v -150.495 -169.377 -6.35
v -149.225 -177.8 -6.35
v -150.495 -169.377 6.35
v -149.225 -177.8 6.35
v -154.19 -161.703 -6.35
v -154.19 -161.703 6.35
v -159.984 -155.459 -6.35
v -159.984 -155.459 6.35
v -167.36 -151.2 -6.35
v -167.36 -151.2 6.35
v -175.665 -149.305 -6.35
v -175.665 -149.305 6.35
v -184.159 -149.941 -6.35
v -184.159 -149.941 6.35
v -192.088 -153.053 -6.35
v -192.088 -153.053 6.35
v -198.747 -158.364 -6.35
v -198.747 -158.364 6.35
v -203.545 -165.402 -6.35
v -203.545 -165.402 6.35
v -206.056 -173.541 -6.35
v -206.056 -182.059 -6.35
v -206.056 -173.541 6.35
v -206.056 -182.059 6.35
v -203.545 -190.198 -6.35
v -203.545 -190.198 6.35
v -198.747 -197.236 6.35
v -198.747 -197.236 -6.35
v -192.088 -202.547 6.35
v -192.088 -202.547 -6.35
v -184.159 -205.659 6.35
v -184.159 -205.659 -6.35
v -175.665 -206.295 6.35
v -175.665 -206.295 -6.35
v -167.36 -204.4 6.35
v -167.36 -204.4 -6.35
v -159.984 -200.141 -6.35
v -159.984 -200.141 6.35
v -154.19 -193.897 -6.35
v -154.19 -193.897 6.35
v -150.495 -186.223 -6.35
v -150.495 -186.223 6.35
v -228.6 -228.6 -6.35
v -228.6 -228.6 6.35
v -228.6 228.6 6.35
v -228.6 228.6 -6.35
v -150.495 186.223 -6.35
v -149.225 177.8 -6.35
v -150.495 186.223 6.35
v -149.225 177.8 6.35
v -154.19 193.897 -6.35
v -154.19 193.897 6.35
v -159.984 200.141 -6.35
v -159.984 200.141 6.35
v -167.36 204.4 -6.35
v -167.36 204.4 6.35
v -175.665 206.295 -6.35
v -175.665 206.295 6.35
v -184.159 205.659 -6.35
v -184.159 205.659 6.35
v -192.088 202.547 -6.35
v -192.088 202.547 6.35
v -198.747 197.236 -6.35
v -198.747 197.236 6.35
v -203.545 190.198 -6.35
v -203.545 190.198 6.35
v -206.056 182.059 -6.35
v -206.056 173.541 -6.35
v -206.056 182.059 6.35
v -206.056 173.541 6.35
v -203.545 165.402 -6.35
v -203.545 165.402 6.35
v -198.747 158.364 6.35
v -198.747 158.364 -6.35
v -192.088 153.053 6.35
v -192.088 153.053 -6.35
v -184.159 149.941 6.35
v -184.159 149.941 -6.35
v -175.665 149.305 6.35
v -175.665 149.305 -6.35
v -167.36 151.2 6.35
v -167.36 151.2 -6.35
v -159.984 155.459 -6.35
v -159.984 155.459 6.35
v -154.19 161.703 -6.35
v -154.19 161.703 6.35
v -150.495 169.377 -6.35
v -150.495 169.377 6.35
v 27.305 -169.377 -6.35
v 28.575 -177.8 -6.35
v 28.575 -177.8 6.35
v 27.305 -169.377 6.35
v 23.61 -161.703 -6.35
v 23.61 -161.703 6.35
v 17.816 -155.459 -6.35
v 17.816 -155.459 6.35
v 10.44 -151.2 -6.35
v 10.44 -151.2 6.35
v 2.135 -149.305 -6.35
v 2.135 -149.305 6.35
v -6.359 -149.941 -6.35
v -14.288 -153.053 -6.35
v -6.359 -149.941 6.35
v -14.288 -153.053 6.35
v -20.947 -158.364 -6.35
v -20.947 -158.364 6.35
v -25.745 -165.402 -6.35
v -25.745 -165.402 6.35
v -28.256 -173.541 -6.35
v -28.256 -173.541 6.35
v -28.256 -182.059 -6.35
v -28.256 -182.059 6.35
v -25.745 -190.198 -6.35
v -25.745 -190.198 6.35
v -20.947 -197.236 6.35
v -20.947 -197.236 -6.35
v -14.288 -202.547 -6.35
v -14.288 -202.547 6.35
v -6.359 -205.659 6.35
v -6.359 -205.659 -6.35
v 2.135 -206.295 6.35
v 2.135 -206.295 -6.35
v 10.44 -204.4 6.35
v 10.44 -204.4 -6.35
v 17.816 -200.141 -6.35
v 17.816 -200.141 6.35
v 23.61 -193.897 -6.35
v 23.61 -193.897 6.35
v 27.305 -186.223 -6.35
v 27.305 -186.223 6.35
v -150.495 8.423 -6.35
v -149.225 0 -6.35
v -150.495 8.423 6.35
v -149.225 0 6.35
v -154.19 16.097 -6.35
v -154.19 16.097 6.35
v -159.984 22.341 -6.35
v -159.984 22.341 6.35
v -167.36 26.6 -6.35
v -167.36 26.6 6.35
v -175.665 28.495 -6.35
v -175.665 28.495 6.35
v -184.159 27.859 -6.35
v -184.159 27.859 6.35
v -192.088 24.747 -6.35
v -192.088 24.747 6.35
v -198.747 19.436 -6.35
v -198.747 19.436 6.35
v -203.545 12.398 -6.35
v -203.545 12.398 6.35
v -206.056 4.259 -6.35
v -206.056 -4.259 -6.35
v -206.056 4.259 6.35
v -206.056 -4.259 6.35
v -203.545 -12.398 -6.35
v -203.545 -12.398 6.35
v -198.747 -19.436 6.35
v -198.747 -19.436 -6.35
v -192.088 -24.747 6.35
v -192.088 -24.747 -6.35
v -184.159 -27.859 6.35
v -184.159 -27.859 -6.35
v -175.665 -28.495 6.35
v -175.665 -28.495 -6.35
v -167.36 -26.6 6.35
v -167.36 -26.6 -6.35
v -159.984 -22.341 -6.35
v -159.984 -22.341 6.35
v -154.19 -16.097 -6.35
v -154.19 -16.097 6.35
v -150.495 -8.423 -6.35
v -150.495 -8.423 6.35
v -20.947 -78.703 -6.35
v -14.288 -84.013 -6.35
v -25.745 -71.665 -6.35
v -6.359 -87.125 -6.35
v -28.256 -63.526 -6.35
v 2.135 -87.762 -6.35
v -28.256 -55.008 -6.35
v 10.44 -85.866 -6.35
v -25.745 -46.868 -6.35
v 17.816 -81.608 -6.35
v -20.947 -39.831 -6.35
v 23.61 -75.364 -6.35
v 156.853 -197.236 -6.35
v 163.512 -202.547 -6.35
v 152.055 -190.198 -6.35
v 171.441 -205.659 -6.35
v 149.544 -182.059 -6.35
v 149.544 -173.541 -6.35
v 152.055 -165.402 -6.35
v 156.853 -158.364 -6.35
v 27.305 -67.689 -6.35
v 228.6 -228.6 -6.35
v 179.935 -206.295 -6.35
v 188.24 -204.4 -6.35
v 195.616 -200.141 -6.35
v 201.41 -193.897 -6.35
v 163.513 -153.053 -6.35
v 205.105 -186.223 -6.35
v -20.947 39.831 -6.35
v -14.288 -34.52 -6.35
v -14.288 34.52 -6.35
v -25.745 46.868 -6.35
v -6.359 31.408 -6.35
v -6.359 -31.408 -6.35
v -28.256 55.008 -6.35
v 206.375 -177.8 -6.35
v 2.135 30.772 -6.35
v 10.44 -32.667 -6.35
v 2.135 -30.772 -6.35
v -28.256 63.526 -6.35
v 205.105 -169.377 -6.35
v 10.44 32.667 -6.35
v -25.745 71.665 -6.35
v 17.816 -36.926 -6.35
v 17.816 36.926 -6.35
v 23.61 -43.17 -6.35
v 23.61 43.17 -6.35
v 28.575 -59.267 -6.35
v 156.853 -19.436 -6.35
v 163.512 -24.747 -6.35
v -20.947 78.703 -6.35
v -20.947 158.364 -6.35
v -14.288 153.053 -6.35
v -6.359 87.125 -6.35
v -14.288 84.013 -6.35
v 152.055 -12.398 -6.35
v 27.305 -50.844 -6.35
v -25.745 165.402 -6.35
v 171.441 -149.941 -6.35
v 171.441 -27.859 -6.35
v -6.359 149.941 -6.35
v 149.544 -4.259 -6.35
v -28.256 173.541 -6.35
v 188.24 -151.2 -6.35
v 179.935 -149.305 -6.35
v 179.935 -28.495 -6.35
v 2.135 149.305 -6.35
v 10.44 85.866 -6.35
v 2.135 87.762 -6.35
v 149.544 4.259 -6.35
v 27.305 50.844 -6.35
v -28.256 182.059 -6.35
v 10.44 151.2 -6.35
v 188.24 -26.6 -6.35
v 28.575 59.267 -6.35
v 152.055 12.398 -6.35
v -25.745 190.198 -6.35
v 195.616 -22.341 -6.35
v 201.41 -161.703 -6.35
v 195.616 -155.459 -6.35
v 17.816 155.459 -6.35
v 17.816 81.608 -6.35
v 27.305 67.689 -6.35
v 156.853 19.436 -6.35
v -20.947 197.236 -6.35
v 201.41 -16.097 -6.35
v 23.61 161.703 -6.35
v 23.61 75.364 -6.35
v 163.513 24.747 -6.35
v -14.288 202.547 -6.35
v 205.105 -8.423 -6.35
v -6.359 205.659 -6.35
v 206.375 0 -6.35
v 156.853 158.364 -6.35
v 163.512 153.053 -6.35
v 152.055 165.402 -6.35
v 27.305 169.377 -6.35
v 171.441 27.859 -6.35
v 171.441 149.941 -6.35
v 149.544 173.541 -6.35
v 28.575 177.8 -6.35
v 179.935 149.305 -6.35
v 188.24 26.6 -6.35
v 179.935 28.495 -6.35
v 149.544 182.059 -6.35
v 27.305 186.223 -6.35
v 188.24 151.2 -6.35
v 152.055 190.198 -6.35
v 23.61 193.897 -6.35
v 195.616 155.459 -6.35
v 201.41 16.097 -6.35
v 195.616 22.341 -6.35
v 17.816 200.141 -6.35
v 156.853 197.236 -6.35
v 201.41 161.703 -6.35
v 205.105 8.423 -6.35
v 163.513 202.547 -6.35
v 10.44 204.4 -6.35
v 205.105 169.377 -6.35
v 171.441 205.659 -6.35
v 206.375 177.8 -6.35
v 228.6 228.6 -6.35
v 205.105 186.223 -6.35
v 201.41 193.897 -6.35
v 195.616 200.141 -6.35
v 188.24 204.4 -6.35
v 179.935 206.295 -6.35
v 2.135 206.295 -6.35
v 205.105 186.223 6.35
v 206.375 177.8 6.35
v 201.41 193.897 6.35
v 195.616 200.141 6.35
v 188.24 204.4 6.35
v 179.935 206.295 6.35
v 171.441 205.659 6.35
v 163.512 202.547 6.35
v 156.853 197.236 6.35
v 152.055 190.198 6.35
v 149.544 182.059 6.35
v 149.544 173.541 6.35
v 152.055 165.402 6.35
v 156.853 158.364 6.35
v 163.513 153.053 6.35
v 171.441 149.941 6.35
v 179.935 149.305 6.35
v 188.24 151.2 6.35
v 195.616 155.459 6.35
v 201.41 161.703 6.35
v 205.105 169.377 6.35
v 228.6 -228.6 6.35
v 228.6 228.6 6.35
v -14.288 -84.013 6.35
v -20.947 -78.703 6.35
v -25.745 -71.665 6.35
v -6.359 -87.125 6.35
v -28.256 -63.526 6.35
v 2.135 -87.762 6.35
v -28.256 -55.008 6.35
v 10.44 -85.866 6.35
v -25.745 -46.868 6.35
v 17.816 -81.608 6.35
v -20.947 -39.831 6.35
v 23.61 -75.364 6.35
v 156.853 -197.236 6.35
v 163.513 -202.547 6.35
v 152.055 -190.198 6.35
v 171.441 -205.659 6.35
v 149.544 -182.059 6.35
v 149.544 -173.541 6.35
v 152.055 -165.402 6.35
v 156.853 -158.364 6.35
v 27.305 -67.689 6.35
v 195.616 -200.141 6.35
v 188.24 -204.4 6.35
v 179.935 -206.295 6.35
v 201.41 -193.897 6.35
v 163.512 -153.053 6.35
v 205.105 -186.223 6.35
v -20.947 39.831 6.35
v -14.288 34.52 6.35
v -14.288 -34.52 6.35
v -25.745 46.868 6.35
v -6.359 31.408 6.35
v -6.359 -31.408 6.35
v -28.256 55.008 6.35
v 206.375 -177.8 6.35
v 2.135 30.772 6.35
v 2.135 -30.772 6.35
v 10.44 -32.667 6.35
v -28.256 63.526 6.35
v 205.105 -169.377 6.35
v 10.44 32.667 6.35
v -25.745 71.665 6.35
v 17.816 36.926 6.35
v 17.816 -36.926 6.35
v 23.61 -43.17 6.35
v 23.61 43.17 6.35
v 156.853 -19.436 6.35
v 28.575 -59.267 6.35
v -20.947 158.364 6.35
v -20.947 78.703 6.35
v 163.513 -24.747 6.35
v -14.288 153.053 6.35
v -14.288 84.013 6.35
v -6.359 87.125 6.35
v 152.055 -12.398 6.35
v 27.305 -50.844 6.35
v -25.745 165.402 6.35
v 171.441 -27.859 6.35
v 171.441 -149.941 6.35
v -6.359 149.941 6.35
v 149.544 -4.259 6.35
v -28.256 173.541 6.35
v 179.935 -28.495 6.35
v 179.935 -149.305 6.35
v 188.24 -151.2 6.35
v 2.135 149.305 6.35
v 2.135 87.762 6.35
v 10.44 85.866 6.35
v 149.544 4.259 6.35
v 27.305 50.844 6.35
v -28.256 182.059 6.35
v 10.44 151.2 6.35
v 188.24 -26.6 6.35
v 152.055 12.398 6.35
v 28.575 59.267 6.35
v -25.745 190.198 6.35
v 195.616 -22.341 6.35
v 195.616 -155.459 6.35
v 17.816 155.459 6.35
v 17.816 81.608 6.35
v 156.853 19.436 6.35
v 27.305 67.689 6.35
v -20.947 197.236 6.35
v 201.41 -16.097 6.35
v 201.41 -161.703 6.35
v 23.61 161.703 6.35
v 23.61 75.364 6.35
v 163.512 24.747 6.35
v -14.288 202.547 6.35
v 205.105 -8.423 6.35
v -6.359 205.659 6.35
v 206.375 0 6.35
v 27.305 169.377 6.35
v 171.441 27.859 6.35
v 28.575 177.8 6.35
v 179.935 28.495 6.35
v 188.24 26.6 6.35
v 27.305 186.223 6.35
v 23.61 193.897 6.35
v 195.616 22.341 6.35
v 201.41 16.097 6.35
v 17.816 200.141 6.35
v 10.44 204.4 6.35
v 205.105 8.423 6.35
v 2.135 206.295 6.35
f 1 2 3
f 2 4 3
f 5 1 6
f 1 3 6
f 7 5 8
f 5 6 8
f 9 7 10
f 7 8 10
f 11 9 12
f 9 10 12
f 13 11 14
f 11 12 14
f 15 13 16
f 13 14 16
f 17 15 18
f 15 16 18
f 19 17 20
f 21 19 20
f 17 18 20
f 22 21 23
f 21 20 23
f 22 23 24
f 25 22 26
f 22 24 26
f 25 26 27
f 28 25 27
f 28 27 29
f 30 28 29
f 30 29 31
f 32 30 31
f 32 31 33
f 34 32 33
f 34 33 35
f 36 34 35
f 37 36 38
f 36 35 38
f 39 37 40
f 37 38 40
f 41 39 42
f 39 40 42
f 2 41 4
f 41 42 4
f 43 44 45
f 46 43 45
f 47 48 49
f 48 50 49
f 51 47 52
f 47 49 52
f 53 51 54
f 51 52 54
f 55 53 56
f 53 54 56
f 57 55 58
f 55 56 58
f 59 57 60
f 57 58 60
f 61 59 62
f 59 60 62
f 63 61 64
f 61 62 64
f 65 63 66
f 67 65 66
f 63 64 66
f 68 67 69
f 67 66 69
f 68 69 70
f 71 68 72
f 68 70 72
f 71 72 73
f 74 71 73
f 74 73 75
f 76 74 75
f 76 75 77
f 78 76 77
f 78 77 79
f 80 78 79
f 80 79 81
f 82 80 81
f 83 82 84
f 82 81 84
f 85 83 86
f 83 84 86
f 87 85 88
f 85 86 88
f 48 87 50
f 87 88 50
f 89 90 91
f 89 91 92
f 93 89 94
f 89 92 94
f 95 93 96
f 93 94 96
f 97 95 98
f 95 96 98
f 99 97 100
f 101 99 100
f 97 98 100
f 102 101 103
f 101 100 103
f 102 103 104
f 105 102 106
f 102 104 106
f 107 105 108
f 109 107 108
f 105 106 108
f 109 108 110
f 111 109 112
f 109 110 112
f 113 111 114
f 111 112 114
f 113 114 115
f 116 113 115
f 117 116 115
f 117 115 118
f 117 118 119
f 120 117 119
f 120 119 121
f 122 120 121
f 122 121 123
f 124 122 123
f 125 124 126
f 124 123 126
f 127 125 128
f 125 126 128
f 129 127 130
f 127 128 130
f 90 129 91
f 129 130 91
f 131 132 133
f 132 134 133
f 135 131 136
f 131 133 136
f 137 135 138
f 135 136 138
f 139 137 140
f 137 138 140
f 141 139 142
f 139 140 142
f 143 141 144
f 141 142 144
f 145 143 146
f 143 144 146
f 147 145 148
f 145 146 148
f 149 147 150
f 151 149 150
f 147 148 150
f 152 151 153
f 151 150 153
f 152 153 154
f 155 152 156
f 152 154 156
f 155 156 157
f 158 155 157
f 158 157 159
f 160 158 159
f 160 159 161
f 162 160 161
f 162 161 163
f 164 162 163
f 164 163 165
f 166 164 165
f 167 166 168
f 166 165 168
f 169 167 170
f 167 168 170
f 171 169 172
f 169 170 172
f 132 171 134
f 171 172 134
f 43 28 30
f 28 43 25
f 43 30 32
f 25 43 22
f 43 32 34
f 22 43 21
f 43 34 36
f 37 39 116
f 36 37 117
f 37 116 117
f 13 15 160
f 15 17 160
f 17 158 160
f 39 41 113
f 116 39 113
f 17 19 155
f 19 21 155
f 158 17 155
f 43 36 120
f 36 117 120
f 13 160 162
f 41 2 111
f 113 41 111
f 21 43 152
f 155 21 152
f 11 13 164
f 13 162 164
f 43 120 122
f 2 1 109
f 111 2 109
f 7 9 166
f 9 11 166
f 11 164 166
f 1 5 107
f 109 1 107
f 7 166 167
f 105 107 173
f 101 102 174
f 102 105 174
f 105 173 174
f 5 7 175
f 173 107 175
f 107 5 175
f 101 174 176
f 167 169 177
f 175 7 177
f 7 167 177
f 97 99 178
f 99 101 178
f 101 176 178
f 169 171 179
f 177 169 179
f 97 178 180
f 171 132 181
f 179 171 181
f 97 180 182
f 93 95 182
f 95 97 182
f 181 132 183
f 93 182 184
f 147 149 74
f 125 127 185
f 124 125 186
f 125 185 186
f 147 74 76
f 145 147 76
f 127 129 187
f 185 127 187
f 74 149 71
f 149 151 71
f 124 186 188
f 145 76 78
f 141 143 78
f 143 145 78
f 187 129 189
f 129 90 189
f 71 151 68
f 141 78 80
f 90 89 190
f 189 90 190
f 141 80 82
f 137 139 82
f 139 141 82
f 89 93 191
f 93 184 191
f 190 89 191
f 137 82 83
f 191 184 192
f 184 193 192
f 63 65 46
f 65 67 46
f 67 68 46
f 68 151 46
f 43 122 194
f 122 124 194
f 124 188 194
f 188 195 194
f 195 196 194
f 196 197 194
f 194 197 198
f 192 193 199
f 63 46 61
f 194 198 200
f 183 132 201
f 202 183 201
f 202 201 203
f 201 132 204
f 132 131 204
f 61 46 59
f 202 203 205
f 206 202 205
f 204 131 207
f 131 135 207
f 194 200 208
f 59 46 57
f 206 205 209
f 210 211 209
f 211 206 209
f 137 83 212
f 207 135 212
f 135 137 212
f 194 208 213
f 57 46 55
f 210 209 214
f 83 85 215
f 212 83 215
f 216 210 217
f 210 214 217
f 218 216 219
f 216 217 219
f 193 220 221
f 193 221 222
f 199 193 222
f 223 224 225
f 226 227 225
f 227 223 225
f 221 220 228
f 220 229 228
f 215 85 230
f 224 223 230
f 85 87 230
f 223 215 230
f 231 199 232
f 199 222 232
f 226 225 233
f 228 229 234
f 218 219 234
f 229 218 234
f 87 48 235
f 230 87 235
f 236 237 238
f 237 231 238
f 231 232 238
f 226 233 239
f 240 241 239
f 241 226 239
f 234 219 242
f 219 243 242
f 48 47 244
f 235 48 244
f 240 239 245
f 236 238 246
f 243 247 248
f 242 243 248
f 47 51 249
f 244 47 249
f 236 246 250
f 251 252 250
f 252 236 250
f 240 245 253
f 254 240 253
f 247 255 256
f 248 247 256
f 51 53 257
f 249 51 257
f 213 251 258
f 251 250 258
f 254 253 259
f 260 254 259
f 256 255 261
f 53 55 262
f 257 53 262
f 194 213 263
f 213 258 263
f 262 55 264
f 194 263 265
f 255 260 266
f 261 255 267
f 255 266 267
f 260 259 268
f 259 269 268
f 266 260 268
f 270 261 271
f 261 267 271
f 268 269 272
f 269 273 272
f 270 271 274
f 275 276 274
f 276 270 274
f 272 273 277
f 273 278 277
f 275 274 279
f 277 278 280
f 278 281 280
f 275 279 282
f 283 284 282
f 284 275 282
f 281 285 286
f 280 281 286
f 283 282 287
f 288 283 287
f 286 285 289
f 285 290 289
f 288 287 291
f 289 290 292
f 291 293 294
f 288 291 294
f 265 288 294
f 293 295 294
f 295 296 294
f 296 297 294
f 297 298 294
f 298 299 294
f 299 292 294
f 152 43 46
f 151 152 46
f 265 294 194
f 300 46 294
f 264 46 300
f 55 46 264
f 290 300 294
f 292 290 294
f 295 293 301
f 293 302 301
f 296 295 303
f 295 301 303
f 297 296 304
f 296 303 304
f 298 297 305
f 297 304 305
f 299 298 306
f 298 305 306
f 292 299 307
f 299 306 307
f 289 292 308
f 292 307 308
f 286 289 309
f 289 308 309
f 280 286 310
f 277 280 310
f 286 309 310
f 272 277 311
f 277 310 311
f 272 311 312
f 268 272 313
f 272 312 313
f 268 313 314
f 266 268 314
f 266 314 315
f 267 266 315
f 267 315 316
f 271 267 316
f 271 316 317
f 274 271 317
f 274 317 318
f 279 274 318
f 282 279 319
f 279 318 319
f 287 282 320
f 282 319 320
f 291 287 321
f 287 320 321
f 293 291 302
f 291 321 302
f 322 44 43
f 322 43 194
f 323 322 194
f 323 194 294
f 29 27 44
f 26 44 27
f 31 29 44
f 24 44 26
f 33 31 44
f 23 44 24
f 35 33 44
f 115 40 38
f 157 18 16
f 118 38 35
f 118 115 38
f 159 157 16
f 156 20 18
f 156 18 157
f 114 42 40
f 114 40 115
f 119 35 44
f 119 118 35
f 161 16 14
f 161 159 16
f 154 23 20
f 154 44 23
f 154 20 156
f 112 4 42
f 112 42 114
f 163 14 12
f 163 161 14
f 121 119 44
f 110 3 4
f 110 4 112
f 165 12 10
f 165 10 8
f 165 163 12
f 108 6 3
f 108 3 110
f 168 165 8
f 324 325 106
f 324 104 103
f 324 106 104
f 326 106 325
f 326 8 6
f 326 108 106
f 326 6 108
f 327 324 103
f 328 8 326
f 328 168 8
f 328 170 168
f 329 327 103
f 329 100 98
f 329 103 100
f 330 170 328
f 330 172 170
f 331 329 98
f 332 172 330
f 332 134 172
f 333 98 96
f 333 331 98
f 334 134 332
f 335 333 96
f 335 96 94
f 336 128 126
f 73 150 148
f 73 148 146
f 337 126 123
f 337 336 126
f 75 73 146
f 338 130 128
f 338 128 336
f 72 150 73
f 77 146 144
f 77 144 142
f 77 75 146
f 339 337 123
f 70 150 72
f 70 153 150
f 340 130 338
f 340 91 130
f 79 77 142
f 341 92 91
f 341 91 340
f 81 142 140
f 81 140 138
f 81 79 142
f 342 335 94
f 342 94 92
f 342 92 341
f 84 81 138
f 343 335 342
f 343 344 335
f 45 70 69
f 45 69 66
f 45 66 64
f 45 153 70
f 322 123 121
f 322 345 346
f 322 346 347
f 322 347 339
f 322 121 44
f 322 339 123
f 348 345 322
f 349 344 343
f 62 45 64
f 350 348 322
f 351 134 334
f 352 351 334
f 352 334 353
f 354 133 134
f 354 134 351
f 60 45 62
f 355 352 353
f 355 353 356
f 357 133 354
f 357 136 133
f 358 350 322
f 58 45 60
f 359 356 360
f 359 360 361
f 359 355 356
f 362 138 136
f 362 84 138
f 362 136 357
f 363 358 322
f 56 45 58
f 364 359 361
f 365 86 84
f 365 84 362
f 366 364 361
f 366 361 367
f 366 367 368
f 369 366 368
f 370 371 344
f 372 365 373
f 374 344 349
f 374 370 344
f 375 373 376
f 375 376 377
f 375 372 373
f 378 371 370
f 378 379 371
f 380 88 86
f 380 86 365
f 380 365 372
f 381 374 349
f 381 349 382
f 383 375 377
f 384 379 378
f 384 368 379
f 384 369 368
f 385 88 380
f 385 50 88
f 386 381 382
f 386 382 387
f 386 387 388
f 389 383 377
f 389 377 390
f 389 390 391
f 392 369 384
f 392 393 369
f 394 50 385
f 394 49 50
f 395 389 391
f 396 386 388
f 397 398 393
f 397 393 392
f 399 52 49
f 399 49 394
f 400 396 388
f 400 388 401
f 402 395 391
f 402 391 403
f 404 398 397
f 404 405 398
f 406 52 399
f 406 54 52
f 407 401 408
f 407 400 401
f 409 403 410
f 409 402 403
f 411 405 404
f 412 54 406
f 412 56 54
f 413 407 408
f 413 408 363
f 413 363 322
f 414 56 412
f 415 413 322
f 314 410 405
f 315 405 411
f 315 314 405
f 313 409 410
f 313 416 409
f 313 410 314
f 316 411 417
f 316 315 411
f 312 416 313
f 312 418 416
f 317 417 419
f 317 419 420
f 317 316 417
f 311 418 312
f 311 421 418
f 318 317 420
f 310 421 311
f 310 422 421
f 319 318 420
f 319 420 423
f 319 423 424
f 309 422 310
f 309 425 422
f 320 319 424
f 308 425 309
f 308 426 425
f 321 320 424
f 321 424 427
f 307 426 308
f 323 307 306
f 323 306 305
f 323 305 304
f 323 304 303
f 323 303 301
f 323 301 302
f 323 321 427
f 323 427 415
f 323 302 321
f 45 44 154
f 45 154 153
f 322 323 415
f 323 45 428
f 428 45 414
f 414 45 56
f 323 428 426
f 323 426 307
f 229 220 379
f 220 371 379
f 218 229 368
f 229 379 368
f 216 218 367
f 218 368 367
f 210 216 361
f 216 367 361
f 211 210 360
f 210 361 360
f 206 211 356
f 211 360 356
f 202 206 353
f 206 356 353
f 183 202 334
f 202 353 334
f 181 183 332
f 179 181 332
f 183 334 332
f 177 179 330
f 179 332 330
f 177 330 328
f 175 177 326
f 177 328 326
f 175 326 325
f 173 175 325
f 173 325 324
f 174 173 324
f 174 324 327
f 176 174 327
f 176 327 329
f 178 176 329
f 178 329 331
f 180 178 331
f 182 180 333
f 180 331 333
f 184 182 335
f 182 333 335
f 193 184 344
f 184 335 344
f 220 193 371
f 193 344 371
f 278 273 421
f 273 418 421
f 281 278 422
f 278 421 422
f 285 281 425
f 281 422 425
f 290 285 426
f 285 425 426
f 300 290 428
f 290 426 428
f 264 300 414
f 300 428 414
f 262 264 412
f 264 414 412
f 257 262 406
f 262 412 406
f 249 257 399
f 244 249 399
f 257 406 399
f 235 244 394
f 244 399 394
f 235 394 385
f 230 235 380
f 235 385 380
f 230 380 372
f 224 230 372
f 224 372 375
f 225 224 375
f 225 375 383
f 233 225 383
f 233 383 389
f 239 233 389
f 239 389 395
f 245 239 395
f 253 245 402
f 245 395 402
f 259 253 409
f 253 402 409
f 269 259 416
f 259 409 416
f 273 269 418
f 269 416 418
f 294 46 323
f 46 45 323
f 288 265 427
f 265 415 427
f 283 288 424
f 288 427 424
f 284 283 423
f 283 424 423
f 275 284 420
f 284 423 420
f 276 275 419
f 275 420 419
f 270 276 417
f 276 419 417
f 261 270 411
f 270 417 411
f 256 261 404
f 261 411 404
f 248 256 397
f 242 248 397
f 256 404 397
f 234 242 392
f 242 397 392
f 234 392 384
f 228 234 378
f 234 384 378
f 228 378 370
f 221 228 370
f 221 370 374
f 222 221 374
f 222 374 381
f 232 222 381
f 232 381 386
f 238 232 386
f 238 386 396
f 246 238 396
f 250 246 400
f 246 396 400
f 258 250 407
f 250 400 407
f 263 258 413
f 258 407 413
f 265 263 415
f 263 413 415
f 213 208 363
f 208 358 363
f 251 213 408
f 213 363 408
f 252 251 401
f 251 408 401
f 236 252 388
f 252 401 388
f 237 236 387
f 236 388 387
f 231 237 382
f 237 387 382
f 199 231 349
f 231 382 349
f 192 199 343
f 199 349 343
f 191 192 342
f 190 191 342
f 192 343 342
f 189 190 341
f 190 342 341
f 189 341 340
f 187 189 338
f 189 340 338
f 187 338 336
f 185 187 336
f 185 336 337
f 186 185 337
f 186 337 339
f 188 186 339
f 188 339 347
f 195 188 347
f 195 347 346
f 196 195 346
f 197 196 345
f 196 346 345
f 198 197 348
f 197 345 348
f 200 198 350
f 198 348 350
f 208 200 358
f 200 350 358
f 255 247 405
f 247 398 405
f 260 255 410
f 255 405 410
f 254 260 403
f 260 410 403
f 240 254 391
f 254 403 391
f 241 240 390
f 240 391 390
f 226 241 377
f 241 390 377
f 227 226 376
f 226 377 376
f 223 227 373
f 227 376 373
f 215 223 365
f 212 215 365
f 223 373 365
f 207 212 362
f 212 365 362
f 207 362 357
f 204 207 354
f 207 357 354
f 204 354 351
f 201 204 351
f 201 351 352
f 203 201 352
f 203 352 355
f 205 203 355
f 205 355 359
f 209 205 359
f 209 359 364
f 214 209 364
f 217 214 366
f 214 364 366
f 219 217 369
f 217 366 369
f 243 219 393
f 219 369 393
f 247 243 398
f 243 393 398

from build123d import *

# Parameters (mm, degrees)
F0_W     = 457.2
F0_H     = 457.2
F2_DEPTH = 6.35
F1_R     = 28.575
F3_DEPTH = 12.7


with BuildPart() as f2:
    # F0 (on Top) → F2 (new body, symmetric)
    with BuildSketch(Plane.XY):
        Rectangle(F0_W, F0_H)
    extrude(amount=F2_DEPTH, both=True)

    # F1 (on face) → F3 (cut, symmetric)
    with BuildSketch(Plane.XY):
        with Locations((-177.8, 177.8)):
            Circle(F1_R)
        with Locations((0, 177.8)):
            Circle(F1_R)
        with Locations((177.8, 177.8)):
            Circle(F1_R)
        with Locations((177.8, 0)):
            Circle(F1_R)
        with Locations((177.8, -177.8)):
            Circle(F1_R)
        with Locations((-177.8, 0)):
            Circle(F1_R)
        with Locations((-177.8, -177.8)):
            Circle(F1_R)
        with Locations((0, 59.266667)):
            Circle(F1_R)
        with Locations((0, -59.266667)):
            Circle(F1_R)
        with Locations((0, -177.8)):
            Circle(F1_R)
    extrude(amount=F3_DEPTH, both=True, mode=Mode.SUBTRACT)


solid = f2.part
